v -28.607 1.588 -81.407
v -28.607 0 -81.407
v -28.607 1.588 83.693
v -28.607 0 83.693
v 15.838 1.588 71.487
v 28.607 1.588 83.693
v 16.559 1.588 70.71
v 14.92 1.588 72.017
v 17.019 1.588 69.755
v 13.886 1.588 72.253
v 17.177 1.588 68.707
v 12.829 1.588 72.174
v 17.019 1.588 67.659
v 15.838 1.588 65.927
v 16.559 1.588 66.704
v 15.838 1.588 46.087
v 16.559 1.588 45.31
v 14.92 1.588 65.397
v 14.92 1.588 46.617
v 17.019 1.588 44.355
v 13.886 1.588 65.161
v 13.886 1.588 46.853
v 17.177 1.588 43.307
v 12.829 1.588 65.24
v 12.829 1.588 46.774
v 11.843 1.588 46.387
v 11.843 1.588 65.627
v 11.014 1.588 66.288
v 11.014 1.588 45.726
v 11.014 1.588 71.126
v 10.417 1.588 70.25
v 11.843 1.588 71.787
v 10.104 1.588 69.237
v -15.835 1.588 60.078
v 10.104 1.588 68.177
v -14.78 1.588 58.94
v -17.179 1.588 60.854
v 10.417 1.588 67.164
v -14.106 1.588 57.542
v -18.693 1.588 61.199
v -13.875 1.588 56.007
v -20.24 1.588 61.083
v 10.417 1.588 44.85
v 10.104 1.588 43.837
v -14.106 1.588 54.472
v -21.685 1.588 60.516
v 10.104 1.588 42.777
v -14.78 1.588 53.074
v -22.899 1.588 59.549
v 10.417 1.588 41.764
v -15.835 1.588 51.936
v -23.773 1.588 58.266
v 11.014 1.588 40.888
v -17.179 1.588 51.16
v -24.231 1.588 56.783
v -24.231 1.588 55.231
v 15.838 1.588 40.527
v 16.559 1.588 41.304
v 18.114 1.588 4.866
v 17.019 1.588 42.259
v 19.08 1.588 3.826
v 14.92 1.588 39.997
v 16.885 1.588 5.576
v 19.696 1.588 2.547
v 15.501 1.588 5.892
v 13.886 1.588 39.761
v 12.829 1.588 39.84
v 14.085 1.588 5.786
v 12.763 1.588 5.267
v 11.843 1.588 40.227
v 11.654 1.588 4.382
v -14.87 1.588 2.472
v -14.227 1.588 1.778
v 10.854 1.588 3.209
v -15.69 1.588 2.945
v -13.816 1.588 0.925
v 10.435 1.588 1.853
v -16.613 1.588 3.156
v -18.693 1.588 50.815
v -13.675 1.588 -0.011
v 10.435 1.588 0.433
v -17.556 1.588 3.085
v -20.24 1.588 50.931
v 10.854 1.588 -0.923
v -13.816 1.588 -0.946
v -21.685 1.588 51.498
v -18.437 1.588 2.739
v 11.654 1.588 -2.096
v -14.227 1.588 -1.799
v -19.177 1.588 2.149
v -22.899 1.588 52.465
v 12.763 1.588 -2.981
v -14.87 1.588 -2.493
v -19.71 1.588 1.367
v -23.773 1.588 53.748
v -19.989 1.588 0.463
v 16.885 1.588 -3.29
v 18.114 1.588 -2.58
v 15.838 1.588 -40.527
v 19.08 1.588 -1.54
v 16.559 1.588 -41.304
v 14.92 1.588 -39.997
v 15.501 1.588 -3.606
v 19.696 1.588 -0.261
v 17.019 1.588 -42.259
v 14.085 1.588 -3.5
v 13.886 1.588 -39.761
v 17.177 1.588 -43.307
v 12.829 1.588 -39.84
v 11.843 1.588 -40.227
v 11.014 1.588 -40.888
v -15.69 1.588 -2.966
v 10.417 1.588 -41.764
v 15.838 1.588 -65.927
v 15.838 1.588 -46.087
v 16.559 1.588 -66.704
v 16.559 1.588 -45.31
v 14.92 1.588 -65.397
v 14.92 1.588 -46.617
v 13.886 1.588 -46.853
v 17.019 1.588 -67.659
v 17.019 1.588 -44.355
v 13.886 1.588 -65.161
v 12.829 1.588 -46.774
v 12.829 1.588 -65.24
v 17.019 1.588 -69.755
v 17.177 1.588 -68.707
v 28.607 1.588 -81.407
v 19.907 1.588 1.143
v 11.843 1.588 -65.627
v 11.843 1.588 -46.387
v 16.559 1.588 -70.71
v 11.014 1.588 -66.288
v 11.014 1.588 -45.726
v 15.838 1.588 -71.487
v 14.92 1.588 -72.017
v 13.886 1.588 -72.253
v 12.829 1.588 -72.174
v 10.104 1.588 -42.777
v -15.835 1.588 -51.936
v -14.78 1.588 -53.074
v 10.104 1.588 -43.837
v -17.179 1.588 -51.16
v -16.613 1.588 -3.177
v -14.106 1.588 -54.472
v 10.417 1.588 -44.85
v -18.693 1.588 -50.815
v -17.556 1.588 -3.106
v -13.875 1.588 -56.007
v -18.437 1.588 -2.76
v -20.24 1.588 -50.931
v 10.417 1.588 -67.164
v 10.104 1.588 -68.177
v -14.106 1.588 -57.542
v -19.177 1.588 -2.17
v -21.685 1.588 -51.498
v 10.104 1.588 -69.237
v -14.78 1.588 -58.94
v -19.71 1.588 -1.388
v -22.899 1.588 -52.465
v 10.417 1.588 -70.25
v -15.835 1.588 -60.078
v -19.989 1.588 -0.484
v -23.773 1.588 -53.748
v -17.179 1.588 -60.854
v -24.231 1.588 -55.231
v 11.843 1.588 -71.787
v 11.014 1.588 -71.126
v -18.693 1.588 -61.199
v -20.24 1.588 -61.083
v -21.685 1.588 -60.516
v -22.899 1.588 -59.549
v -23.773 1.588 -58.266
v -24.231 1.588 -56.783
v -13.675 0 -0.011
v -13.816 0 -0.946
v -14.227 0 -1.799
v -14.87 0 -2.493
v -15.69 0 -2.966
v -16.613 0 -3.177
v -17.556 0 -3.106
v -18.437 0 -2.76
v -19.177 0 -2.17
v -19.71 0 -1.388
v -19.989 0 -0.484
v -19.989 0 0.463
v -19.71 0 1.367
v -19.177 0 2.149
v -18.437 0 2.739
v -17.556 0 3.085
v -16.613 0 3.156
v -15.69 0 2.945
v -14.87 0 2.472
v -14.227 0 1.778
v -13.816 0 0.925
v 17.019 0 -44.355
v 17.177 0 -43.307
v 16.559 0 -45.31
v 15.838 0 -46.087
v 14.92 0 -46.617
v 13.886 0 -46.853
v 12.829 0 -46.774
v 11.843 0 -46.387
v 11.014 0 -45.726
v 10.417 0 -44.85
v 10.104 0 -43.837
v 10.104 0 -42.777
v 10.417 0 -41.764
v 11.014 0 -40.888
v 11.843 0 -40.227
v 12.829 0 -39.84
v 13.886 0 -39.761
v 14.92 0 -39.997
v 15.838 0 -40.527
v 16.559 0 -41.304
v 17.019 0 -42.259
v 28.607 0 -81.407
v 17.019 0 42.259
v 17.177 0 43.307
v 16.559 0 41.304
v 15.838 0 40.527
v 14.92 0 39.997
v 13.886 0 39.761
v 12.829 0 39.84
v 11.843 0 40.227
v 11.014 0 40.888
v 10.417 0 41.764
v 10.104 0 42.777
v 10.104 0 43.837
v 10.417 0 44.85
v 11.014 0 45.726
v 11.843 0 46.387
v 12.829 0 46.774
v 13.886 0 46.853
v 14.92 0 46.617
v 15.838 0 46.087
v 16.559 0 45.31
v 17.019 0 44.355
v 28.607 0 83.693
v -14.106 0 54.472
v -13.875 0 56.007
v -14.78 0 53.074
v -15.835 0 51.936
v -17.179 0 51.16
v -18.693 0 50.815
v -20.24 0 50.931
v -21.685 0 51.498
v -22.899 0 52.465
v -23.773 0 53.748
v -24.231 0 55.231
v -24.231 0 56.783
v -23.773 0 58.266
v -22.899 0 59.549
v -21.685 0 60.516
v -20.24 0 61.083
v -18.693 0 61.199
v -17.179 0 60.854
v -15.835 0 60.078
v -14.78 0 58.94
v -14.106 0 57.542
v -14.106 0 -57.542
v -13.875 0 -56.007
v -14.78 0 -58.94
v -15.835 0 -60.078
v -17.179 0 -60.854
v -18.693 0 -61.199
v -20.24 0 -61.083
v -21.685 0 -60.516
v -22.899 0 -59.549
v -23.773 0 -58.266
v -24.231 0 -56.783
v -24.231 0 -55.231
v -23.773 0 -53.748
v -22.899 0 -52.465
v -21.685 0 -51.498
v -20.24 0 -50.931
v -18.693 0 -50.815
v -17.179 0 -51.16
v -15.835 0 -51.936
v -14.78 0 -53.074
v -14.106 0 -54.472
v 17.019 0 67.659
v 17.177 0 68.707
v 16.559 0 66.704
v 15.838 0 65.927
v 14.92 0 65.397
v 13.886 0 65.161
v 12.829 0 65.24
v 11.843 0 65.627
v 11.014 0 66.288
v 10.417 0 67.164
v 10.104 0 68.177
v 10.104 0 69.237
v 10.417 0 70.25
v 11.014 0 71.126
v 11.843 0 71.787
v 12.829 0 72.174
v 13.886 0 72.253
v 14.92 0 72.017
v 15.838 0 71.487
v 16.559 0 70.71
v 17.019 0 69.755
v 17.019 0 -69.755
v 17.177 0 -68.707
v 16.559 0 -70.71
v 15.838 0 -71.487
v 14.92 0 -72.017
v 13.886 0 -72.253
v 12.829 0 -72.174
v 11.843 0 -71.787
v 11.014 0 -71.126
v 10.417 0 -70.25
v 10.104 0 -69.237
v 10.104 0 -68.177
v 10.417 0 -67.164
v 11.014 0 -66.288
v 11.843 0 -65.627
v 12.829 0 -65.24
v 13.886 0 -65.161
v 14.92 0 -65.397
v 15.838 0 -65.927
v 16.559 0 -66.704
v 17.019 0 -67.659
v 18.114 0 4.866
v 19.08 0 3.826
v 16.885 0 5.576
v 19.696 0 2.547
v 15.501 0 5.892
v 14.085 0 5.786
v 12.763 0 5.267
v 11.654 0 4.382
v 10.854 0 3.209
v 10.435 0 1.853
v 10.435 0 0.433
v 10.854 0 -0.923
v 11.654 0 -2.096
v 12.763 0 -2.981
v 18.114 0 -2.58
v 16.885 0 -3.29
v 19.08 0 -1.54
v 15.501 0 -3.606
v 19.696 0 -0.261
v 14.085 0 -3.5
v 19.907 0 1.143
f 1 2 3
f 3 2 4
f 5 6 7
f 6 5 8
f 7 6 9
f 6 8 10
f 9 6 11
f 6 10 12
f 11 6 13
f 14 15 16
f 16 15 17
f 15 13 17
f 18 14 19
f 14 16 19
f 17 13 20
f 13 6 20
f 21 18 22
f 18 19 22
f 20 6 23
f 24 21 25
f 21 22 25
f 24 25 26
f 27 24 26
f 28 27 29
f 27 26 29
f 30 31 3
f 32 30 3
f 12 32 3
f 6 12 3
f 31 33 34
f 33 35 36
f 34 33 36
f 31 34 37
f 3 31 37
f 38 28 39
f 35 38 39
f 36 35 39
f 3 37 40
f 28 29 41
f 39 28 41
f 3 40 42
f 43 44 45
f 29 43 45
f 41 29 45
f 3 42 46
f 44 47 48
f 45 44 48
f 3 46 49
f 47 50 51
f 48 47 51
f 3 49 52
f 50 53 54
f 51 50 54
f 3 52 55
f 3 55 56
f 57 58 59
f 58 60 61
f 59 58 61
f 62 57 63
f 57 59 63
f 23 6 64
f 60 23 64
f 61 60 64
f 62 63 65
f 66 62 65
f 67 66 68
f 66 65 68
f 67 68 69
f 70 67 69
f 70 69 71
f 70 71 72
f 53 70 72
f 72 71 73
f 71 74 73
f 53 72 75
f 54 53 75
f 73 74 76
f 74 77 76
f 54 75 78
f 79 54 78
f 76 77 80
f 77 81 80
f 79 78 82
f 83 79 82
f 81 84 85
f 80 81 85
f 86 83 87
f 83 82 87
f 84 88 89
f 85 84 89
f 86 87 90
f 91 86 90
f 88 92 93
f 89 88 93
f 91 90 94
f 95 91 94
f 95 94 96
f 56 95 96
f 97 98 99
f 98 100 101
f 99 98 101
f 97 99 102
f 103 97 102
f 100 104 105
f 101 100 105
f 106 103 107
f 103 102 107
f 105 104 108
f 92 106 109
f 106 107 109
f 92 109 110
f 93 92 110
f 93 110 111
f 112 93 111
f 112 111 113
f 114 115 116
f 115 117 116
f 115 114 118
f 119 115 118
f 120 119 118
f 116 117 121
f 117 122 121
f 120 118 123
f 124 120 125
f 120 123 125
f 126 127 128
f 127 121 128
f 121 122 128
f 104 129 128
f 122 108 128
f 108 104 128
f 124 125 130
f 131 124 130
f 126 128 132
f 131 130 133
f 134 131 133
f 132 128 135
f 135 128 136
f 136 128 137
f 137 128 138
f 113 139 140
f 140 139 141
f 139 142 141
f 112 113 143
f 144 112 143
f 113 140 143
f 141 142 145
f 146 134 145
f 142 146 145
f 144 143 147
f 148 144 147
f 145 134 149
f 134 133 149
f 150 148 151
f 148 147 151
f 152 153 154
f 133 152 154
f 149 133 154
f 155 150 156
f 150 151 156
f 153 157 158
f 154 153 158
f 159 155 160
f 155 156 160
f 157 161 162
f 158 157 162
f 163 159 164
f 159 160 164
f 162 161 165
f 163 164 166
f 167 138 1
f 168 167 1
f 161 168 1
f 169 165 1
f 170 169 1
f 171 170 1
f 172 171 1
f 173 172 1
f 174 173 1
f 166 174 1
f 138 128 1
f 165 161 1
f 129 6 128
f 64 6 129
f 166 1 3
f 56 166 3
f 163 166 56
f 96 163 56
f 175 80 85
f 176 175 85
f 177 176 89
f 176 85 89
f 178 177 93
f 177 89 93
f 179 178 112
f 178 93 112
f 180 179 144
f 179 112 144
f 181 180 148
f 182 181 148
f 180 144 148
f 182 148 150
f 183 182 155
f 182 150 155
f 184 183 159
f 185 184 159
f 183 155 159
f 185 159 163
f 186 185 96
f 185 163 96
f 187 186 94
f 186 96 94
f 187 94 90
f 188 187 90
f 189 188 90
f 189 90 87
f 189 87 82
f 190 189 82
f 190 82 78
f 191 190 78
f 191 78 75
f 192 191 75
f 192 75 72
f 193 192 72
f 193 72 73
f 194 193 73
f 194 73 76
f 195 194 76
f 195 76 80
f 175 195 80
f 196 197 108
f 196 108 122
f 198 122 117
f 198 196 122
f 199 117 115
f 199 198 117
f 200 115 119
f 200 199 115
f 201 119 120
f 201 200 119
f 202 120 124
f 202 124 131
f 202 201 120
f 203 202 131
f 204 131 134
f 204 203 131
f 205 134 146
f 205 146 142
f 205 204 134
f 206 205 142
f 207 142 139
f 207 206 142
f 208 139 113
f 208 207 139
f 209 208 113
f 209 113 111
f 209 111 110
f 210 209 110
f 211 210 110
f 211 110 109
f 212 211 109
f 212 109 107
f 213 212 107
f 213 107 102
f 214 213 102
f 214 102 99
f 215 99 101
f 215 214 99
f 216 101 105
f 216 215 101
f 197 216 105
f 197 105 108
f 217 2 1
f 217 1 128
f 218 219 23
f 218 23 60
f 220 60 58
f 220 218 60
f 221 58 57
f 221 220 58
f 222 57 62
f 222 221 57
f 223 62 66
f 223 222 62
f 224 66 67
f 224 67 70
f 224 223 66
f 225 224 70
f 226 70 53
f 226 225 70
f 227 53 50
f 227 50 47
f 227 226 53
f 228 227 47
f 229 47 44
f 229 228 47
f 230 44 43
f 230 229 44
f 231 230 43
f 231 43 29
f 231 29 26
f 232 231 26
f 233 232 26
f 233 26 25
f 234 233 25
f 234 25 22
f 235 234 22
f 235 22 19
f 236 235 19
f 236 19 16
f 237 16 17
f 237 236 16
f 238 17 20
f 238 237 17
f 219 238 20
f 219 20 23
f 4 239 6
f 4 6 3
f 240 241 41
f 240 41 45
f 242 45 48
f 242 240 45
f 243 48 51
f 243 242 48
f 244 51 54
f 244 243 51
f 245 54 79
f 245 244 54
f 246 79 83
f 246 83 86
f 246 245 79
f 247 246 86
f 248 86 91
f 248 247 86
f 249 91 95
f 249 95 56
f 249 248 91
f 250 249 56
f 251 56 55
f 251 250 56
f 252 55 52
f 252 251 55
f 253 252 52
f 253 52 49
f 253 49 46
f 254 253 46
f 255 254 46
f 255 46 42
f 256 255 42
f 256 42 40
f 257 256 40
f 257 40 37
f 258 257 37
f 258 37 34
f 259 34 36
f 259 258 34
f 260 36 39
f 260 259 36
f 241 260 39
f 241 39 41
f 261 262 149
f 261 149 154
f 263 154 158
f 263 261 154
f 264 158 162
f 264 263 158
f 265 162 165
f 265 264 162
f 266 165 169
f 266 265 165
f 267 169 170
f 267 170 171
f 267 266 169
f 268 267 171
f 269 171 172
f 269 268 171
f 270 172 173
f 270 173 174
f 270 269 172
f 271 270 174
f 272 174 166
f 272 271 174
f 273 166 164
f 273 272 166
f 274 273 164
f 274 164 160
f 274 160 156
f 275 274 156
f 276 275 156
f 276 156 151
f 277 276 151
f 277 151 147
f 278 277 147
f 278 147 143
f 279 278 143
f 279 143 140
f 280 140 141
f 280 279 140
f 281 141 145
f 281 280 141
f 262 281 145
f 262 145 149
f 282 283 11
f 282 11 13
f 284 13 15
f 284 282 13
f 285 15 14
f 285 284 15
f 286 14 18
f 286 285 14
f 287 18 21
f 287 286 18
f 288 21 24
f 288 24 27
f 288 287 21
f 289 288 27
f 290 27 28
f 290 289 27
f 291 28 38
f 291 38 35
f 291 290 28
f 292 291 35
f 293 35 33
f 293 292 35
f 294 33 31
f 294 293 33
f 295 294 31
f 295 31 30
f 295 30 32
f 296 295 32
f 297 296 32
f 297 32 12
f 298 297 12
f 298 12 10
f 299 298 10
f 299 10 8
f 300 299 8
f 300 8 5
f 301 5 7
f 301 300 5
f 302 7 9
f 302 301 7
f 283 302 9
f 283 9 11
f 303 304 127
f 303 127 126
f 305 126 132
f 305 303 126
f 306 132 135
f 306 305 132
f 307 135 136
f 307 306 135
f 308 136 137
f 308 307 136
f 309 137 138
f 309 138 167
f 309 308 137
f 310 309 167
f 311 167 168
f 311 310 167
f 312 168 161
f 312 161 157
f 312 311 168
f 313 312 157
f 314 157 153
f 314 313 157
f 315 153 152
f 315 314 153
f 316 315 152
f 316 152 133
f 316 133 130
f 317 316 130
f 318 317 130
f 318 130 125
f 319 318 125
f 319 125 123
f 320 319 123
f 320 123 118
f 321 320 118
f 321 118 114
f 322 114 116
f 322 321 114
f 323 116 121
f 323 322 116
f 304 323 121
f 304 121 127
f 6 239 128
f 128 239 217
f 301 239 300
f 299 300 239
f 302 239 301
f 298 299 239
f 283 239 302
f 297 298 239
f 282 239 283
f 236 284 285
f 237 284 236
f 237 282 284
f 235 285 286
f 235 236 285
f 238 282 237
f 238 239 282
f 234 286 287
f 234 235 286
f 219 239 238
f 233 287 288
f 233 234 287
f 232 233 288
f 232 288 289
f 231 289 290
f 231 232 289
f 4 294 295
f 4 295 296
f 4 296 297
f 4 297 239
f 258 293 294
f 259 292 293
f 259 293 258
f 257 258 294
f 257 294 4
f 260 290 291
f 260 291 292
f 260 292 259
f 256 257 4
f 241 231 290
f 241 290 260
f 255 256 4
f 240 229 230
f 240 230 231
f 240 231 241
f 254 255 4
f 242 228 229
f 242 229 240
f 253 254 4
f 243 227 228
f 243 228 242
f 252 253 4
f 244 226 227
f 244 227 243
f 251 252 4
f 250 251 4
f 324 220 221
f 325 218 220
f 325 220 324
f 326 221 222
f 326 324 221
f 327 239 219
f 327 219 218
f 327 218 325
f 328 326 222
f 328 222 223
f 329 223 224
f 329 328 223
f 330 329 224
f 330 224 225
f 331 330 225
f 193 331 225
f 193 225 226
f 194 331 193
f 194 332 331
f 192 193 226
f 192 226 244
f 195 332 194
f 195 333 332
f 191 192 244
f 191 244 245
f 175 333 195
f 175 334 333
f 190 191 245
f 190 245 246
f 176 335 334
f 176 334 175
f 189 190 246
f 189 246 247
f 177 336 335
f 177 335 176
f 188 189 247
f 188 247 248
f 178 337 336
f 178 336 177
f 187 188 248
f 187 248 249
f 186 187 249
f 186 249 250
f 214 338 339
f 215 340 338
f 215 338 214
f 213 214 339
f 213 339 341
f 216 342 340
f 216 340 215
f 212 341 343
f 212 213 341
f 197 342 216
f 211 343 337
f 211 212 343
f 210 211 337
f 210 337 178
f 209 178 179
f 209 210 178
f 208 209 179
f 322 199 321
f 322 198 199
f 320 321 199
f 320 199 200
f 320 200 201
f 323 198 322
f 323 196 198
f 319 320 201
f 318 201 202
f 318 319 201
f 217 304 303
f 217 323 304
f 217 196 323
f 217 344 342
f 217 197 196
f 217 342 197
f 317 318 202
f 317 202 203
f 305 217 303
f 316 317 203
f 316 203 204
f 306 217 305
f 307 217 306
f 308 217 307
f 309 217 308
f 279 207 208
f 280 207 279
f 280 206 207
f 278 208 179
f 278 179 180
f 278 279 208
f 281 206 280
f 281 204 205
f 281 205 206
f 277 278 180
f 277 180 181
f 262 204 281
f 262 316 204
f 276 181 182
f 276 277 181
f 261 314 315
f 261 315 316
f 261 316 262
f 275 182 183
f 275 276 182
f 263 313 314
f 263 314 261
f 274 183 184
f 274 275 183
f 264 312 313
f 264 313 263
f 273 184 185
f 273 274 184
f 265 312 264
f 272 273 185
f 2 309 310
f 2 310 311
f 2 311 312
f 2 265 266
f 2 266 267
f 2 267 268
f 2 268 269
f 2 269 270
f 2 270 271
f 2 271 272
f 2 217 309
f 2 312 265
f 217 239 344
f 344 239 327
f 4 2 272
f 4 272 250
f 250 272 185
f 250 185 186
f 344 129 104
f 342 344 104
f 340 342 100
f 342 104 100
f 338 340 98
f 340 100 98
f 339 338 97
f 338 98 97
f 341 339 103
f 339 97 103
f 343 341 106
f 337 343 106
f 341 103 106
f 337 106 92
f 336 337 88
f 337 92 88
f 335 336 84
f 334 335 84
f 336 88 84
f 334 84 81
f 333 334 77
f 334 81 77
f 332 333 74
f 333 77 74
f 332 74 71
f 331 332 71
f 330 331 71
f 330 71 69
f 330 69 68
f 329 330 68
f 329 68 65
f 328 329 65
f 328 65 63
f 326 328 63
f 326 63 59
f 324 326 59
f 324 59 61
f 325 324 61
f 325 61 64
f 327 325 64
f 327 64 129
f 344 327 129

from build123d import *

# Parameters (mm, degrees)
SKETCH1_R           = 5.207
SKETCH1_R_2         = 3.556
BOSS_EXTRUDE1_DEPTH = 1.5875
SKETCH2_R           = 3.175
CUT_EXTRUDE1_DEPTH  = 2.5875
SKETCH3_R           = 4.7625
CUT_EXTRUDE2_DEPTH  = 2.54


with BuildPart() as part:
    # Sketch1 → Boss-Extrude1 (new body)
    with BuildSketch(Plane(origin=(0, 0, 0), x_dir=(1, 0, 0), z_dir=(0, 1, 0))):
        Polygon((-28.60675, 81.407), (28.60675, 81.407), (28.60675, -81.407), (28.60675, -83.693), (-28.60675, -83.693), (-28.60675, -81.407), align=None)
        with Locations((-19.08175, 56.007)):
            Circle(SKETCH1_R, mode=Mode.SUBTRACT)
        with Locations((-19.08175, -56.007)):
            Circle(SKETCH1_R, mode=Mode.SUBTRACT)
        with Locations((13.62075, 68.707)):
            Circle(SKETCH1_R_2, mode=Mode.SUBTRACT)
        with Locations((13.62075, 43.307)):
            Circle(SKETCH1_R_2, mode=Mode.SUBTRACT)
        with Locations((13.62075, -43.307)):
            Circle(SKETCH1_R_2, mode=Mode.SUBTRACT)
        with Locations((13.62075, -68.707)):
            Circle(SKETCH1_R_2, mode=Mode.SUBTRACT)
    extrude(amount=BOSS_EXTRUDE1_DEPTH)

    # Sketch2 → Cut-Extrude1 (cut, through all)
    with BuildSketch(Plane(origin=(0, 1.5875, 0), x_dir=(1, 0, 0), z_dir=(0, 1, 0))):
        with Locations((-16.849815709, 0.01058698)):
            Circle(SKETCH2_R)
    extrude(amount=-CUT_EXTRUDE1_DEPTH, mode=Mode.SUBTRACT)

    # Sketch3 → Cut-Extrude2 (cut)
    with BuildSketch(Plane(origin=(0, 1.5875, 0), x_dir=(1, 0, 0), z_dir=(0, 1, 0))):
        with Locations((15.14475, -1.143)):
            Circle(SKETCH3_R)
    extrude(amount=-CUT_EXTRUDE2_DEPTH, mode=Mode.SUBTRACT)


solid = part.part
